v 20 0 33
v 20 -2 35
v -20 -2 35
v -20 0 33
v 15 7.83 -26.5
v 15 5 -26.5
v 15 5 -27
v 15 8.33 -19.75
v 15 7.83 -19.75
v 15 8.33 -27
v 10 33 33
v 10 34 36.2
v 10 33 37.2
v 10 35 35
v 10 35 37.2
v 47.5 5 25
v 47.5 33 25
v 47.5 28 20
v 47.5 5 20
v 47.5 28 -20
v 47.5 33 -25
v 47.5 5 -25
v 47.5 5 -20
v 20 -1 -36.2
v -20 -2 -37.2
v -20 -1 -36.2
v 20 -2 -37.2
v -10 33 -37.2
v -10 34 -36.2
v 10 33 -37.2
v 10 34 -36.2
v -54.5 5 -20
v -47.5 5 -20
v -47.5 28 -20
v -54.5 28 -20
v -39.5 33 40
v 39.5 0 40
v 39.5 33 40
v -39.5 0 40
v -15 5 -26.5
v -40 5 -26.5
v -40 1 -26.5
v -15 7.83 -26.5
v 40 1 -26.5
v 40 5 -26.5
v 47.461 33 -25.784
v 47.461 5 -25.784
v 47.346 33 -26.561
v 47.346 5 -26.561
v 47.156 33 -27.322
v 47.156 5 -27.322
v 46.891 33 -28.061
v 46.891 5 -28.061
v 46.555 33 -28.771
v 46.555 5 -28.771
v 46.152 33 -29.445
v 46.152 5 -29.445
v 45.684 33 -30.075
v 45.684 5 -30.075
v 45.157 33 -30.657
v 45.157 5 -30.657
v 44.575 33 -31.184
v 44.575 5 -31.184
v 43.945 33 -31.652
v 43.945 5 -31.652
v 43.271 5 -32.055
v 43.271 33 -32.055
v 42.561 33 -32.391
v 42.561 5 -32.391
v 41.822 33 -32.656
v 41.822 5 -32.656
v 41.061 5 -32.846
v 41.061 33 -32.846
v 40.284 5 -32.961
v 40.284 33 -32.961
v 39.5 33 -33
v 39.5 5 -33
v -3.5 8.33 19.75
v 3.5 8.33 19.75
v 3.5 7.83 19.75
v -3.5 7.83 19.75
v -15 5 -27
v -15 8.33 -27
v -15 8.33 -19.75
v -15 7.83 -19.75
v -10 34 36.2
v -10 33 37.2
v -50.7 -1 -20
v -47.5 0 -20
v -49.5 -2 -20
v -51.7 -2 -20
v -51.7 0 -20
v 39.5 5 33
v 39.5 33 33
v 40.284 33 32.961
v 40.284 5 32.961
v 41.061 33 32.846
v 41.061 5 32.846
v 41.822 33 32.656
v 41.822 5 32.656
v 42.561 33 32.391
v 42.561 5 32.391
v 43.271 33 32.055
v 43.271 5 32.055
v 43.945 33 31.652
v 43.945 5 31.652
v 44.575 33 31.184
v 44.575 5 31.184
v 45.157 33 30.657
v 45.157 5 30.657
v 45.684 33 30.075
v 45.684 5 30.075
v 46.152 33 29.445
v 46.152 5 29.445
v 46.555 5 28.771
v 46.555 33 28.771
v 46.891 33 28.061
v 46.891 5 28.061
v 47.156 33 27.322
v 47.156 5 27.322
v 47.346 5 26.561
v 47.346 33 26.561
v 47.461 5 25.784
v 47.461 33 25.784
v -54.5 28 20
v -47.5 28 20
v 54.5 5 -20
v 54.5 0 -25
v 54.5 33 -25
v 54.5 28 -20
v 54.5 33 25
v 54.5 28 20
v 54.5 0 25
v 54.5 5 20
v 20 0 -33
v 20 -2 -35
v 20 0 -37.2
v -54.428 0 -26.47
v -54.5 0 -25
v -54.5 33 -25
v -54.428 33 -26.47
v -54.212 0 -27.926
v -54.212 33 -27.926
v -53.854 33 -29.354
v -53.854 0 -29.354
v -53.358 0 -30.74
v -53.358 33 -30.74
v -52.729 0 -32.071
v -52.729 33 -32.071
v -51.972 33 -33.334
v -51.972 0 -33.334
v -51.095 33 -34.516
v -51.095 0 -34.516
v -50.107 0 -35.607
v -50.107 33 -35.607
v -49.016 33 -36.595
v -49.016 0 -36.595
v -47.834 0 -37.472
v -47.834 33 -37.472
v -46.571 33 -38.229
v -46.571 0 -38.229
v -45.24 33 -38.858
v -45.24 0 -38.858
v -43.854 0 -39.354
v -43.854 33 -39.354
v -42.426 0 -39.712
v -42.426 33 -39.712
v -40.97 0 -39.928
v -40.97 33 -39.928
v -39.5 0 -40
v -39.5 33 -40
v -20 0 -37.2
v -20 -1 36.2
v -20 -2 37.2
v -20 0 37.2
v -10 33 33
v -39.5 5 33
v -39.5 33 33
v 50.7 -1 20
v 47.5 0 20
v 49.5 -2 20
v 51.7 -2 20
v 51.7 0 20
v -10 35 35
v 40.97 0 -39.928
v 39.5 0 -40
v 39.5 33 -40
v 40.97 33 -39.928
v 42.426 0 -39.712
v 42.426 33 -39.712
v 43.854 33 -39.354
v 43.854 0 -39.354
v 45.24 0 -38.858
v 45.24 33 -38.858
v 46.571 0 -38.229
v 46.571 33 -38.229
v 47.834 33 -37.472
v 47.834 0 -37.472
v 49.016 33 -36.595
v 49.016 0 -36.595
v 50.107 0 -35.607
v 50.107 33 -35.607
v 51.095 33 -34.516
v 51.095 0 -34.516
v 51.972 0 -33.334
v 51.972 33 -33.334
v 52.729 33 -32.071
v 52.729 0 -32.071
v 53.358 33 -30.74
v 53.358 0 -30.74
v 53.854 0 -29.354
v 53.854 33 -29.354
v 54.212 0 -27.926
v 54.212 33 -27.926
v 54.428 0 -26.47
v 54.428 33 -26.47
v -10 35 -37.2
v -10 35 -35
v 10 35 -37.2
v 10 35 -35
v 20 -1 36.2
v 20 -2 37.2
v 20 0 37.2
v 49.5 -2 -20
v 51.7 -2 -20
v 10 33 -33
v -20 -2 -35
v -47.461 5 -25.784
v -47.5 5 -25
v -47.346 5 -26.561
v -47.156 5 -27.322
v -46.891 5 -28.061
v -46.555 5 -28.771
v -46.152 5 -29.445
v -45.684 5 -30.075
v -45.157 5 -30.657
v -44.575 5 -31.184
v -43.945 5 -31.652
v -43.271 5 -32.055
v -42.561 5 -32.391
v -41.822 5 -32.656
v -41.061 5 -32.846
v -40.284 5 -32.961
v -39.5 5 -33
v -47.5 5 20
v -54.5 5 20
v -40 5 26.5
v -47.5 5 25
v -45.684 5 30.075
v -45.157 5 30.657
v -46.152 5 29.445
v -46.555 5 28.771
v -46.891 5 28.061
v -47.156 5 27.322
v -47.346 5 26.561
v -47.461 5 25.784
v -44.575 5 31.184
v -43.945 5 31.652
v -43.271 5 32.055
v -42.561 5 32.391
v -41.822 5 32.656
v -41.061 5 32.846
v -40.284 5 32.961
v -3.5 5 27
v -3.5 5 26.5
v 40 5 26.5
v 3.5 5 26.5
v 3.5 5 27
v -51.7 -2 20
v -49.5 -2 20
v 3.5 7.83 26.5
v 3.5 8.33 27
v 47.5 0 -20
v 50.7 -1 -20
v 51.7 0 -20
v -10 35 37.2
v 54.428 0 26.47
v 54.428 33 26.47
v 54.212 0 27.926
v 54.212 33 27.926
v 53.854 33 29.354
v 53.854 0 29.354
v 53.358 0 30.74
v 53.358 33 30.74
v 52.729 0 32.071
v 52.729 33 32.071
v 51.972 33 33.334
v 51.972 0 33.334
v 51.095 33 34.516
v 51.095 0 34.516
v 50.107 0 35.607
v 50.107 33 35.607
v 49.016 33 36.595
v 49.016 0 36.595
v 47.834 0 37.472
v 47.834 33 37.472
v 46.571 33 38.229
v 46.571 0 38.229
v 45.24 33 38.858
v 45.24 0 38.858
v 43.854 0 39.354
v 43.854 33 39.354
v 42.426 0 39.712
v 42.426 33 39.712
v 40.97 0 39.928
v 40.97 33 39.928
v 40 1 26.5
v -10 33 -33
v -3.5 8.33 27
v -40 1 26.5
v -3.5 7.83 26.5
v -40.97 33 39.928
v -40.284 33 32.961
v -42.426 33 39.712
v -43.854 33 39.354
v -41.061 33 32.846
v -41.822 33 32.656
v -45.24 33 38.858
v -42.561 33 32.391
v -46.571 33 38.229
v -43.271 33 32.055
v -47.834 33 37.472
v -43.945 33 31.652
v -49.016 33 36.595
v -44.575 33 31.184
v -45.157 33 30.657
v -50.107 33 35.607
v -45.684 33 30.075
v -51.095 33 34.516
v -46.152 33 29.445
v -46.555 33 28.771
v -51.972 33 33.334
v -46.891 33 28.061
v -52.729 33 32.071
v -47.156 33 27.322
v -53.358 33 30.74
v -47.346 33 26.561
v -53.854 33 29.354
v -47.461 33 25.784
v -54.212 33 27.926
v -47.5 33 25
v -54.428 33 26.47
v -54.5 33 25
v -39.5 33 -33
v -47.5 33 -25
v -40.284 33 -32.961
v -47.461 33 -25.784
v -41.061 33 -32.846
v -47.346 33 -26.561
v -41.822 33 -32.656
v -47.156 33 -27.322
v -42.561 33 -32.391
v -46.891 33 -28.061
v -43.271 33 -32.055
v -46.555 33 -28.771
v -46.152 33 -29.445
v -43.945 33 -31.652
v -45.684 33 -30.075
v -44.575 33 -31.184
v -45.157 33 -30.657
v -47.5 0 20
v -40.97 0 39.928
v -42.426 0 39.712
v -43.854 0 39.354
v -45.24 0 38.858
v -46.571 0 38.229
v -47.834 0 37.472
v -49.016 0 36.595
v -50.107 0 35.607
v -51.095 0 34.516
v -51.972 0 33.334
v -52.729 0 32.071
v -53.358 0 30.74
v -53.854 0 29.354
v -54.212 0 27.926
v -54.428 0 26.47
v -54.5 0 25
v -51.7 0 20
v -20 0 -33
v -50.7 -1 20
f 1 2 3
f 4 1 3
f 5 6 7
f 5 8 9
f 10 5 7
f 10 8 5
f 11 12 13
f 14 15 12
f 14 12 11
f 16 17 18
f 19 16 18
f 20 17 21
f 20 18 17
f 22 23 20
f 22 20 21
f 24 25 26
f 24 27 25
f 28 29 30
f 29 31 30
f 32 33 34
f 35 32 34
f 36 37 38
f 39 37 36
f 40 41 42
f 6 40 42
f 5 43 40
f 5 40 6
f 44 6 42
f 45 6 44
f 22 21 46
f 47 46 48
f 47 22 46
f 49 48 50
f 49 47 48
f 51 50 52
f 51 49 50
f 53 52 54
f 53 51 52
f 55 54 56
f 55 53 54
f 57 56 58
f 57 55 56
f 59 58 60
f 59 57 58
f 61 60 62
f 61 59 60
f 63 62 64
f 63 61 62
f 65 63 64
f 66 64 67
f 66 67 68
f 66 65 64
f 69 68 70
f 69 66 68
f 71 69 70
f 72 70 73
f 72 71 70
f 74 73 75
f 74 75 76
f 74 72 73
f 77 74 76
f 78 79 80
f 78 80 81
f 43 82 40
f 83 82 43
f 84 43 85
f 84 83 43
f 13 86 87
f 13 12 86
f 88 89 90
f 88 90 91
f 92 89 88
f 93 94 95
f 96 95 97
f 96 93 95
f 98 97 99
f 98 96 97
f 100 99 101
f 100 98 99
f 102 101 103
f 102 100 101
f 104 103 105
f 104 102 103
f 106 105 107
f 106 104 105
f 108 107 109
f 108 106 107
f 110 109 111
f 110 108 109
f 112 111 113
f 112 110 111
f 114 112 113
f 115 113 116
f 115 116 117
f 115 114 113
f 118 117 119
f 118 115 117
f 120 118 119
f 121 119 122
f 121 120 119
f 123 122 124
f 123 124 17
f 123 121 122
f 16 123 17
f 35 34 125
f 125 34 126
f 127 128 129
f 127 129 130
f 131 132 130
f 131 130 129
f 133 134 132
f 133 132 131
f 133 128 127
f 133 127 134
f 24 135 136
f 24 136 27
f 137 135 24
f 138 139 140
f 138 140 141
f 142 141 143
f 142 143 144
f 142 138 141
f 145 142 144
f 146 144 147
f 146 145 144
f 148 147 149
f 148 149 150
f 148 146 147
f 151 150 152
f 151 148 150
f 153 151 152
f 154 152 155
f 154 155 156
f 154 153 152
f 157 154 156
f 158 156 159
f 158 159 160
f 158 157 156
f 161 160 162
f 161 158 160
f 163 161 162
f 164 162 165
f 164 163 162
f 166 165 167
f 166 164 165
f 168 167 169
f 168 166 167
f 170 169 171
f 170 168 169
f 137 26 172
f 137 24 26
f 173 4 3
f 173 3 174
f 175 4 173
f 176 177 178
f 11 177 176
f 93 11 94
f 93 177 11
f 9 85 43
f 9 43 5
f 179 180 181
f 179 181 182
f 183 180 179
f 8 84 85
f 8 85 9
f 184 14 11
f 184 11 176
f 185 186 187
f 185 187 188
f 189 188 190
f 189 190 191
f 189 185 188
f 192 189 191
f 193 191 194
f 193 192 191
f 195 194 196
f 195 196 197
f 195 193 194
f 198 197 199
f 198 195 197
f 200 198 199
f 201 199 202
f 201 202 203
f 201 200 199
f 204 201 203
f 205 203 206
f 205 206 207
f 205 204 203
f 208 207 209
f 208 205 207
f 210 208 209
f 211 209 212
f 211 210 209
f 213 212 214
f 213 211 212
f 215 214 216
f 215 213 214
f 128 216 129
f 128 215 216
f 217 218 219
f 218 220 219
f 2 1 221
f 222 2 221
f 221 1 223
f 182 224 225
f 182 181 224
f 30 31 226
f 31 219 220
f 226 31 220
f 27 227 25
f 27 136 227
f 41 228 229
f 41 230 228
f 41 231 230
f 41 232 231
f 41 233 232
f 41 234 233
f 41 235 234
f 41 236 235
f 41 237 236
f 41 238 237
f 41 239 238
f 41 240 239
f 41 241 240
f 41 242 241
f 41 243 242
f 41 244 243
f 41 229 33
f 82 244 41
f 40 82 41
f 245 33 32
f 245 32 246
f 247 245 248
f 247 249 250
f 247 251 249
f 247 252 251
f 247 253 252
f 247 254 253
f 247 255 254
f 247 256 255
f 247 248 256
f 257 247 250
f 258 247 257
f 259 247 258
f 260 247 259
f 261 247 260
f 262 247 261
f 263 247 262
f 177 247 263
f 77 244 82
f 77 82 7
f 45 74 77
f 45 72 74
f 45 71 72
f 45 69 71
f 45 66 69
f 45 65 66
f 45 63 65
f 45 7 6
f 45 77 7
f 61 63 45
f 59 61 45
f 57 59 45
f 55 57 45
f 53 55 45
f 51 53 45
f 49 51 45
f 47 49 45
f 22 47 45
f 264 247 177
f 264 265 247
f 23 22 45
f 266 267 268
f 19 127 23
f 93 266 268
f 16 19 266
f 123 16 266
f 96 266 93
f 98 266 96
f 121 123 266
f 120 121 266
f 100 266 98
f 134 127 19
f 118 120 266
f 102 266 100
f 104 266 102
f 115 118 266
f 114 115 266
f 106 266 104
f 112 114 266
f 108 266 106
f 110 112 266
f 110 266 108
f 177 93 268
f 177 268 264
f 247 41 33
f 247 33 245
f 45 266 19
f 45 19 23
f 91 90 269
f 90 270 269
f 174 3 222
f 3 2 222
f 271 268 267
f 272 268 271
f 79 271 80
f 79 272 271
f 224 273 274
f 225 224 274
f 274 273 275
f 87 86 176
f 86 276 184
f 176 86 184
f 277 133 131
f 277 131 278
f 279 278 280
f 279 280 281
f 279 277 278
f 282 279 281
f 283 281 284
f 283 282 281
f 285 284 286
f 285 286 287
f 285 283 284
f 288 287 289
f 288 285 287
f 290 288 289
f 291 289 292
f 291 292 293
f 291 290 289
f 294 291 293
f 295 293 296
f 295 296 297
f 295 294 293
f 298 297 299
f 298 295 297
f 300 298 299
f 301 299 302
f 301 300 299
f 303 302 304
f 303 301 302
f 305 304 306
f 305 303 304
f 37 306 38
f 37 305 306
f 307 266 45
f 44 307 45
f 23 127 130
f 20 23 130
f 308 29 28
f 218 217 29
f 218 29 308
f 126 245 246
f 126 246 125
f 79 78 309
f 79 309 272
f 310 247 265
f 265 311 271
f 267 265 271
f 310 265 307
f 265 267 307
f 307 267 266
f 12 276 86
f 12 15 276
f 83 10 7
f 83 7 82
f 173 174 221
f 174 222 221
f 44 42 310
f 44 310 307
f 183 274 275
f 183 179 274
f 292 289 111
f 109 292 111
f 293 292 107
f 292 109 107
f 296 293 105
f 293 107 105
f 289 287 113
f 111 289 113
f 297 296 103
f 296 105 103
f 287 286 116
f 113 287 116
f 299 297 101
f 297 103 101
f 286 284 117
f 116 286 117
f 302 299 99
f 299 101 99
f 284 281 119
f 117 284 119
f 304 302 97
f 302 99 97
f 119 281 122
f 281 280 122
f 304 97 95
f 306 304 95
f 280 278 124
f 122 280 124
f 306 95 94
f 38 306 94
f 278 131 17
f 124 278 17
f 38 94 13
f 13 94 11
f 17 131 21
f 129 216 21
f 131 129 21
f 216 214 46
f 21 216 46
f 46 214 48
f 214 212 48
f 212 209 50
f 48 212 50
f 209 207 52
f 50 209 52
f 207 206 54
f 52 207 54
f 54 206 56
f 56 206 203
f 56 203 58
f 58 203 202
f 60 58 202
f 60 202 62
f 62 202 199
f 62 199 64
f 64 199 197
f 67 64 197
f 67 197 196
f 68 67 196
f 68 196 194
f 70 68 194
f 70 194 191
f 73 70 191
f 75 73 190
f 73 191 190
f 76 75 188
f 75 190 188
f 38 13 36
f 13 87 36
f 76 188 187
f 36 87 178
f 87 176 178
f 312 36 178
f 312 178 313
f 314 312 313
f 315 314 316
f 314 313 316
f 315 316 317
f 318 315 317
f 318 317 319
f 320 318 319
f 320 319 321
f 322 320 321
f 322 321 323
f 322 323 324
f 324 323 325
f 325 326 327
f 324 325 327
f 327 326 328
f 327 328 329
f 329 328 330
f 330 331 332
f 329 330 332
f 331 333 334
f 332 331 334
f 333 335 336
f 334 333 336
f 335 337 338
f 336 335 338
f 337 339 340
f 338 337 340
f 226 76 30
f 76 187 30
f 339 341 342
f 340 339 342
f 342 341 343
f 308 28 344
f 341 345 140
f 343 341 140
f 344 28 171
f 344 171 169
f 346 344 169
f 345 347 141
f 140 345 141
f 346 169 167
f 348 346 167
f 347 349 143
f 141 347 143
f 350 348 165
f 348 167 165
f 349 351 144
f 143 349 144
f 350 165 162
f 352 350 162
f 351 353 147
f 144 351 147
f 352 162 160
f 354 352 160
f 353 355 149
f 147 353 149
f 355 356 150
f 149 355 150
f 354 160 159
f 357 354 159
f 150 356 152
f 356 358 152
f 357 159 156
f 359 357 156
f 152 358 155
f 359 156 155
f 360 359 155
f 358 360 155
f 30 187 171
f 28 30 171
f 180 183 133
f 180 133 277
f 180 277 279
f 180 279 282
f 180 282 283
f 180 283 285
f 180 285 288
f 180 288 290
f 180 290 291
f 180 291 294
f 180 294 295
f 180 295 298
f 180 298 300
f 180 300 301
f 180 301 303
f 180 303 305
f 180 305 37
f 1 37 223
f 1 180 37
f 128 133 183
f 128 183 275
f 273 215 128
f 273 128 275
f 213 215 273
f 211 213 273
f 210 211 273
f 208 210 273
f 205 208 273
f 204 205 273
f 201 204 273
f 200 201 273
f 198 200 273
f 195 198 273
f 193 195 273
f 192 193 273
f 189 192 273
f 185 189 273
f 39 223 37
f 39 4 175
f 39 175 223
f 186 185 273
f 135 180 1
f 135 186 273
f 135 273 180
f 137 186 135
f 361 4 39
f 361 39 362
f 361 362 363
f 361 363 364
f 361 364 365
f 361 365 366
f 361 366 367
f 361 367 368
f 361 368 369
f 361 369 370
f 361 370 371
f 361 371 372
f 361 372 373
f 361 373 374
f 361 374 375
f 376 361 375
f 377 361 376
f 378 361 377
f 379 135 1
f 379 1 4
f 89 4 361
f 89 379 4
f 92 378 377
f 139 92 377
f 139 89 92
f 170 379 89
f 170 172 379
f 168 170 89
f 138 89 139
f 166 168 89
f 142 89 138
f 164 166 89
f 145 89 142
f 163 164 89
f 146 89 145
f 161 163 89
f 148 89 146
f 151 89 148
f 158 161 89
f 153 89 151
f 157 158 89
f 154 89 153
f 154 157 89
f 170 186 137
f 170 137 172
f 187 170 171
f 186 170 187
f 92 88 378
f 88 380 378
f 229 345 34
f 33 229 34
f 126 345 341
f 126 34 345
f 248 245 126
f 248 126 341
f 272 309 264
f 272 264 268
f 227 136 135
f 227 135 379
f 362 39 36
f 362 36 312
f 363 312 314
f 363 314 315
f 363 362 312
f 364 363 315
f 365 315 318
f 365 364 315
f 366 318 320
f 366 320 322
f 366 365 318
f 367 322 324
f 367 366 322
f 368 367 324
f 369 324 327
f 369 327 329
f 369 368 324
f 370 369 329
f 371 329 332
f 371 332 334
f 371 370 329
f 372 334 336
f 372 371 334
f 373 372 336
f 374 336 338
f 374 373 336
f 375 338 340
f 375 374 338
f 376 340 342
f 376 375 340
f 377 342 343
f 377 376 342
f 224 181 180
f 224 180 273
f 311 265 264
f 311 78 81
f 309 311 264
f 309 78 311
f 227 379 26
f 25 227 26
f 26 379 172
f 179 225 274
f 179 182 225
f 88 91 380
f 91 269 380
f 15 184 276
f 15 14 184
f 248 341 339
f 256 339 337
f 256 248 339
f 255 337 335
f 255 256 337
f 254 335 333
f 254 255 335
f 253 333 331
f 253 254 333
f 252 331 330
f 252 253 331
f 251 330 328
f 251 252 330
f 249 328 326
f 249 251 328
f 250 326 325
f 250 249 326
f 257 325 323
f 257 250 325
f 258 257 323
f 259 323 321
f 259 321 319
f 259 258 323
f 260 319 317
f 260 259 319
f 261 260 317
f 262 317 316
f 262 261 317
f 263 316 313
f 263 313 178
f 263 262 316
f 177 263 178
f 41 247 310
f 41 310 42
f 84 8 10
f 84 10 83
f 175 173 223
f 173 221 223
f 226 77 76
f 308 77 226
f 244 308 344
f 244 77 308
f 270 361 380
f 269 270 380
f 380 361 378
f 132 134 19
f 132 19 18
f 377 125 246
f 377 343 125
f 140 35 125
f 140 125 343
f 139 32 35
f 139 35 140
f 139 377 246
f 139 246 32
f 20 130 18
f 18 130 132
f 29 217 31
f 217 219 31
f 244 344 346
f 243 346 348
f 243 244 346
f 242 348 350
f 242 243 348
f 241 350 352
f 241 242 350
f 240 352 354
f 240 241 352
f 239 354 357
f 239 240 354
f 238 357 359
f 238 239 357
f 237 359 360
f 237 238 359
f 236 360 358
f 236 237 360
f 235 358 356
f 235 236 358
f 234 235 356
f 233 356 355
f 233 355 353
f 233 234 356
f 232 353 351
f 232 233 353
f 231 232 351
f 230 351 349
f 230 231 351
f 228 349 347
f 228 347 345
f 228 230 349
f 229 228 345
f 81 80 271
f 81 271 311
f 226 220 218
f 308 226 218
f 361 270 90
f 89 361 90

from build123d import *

# Parameters (mm, degrees)
BOSS_EXTRUDE1_DEPTH     = 5
BOSS_EXTRUDE3_DEPTH     = 33
CUT_EXTRUDE2_DEPTH      = 121.706255016
CUT_EXTRUDE2_DEPTH_BACK = 121.706255016
SKETCH7_W               = 40
SKETCH7_H               = 23
CUT_EXTRUDE4_START      = 5
SKETCH3_W               = 80
SKETCH3_H               = 53
CUT_EXTRUDE4_DEPTH      = 4
SKETCH11_W              = 30
SKETCH11_H              = 0.5
SKETCH10_W              = 7
SKETCH10_H              = 0.5
BOSS_EXTRUDE4_START     = -54.5
BOSS_EXTRUDE4_DEPTH     = 20
BOSS_EXTRUDE5_DEPTH     = 20
BOSS_EXTRUDE6_DEPTH     = 10
CHAMFER1_SIZE           = 2


with BuildPart() as part:
    # Sketch1 → Boss-Extrude1 (new body)
    with BuildSketch(Plane(origin=(0, 0, 0), x_dir=(1, 0, 0), z_dir=(0, 1, 0))):
        with BuildLine():
            Line((-39.5, 40), (39.5, 40))
            ThreePointArc((39.5, 40), (50.106601718, 35.606601718), (54.5, 25))
            Line((54.5, 25), (54.5, -25))
            ThreePointArc((54.5, -25), (50.106601718, -35.606601718), (39.5, -40))
            Line((39.5, -40), (-39.5, -40))
            ThreePointArc((-39.5, -40), (-50.106601718, -35.606601718), (-54.5, -25))
            Line((-54.5, -25), (-54.5, 25))
            ThreePointArc((-54.5, 25), (-50.106601718, 35.606601718), (-39.5, 40))
        make_face()
    extrude(amount=BOSS_EXTRUDE1_DEPTH)

    # Sketch1<3> → Boss-Extrude3 (add)
    with BuildSketch(Plane(origin=(0, 0, 0), x_dir=(1, 0, 0), z_dir=(0, 1, 0))):
        with BuildLine():
            Line((-39.5, 40), (39.5, 40))
            ThreePointArc((39.5, 40), (50.106601718, 35.606601718), (54.5, 25))
            Line((54.5, 25), (54.5, -25))
            ThreePointArc((54.5, -25), (50.106601718, -35.606601718), (39.5, -40))
            Line((39.5, -40), (-39.5, -40))
            ThreePointArc((-39.5, -40), (-50.106601718, -35.606601718), (-54.5, -25))
            Line((-54.5, -25), (-54.5, 25))
            ThreePointArc((-54.5, 25), (-50.106601718, 35.606601718), (-39.5, 40))
        make_face()
        with BuildLine():
            ThreePointArc((-39.5, 33), (-45.156854249, 30.656854249), (-47.5, 25))
            Line((-47.5, 25), (-47.5, -25))
            ThreePointArc((-47.5, -25), (-45.156854249, -30.656854249), (-39.5, -33))
            Line((-39.5, -33), (39.5, -33))
            ThreePointArc((39.5, -33), (45.156854249, -30.656854249), (47.5, -25))
            Line((47.5, -25), (47.5, 25))
            ThreePointArc((47.5, 25), (45.156854249, 30.656854249), (39.5, 33))
            Line((39.5, 33), (-39.5, 33))
        make_face(mode=Mode.SUBTRACT)
    extrude(amount=BOSS_EXTRUDE3_DEPTH)

    # Sketch7 → Cut-Extrude2 (cut, two sides: drawn at the far end of the back side and taken through both)
    with BuildSketch(Plane.ZY.offset(54.5).offset(-CUT_EXTRUDE2_DEPTH_BACK)):
        with Locations((0, 16.5)):
            Rectangle(SKETCH7_W, SKETCH7_H)
    extrude(amount=CUT_EXTRUDE2_DEPTH + CUT_EXTRUDE2_DEPTH_BACK, mode=Mode.SUBTRACT)

    # Sketch3 → Cut-Extrude4 (cut)
    with BuildSketch(Plane(origin=(0, 0, 0), x_dir=(1, 0, 0), z_dir=(0, 1, 0)).offset(CUT_EXTRUDE4_START)):
        Rectangle(SKETCH3_W, SKETCH3_H)
    extrude(amount=-CUT_EXTRUDE4_DEPTH, mode=Mode.SUBTRACT)

    # Sweep2: sweep along a path in Sketch13
    with BuildLine(Plane(origin=(0, 0, 0), x_dir=(0, 0, -1), z_dir=(1, 0, 0))) as sweep2_path:
        Line((26.75, 5), (26.75, 8.08))
        Line((26.75, 8.08), (19.75, 8.08))
    # Sketch11 → Sweep2 (sweep)
    with BuildSketch(Plane(origin=(0, 5, 0), x_dir=(1, 0, 0), z_dir=(0, 1, 0))):
        with Locations((0, 26.75)):
            Rectangle(SKETCH11_W, SKETCH11_H)
    sweep(path=sweep2_path.line, transition=Transition.RIGHT)

    # Sweep3: sweep along a path in Sketch12
    with BuildLine(Plane(origin=(0, 0, 0), x_dir=(0, 0, -1), z_dir=(1, 0, 0))) as sweep3_path:
        Line((-26.75, 5), (-26.75, 8.08))
        Line((-26.75, 8.08), (-19.75, 8.08))
    # Sketch10 → Sweep3 (sweep)
    with BuildSketch(Plane(origin=(0, 5, 0), x_dir=(1, 0, 0), z_dir=(0, 1, 0))):
        with Locations((0, -26.75)):
            Rectangle(SKETCH10_W, SKETCH10_H)
    sweep(path=sweep3_path.line, transition=Transition.RIGHT)

    # Sketch19 → Boss-Extrude4 (add, symmetric)
    with BuildSketch(Plane(origin=(54.5, 0, 0), x_dir=(0, 0, -1), z_dir=(1, 0, 0)).offset(BOSS_EXTRUDE4_START)):
        Polygon((36.2, -1), (37.2, 0), (33, 0), (33, -2), (37.2, -2), align=None)
    boss_extrude4 = extrude(amount=BOSS_EXTRUDE4_DEPTH, both=True)

    # Mirror2: Boss-Extrude4 across plane
    add(boss_extrude4.mirror(Plane.XY))

    # Sketch20 → Boss-Extrude5 (add, symmetric)
    with BuildSketch(Plane.XY):
        Polygon((50.7, -1), (51.7, 0), (47.5, 0), (47.5, -2), (51.7, -2), align=None)
    boss_extrude5 = extrude(amount=BOSS_EXTRUDE5_DEPTH, both=True)

    # Mirror3: Boss-Extrude5 across plane
    add(boss_extrude5.mirror(Plane(origin=(0, 0, 0), x_dir=(0, 0, 1), z_dir=(1, 0, 0))))

    # Sketch21 → Boss-Extrude6 (add, symmetric)
    with BuildSketch(Plane(origin=(0, 0, 0), x_dir=(0, 0, -1), z_dir=(1, 0, 0))):
        Polygon((-36.2, 34), (-37.2, 33), (-33, 33), (-33, 35), (-37.2, 35), align=None)
    boss_extrude6 = extrude(amount=BOSS_EXTRUDE6_DEPTH, both=True)

    # Mirror4: Boss-Extrude6 across plane
    add(boss_extrude6.mirror(Plane.XY))

    # Chamfer1
    chamfer1_edges = [part.edges().sort_by_distance(p)[0] for p in [
        (-47.5, -2, 0),
        (0, -2, -33),
        (47.5, -2, 0),
        (0, -2, 33),
        (0, 35, -33),
        (0, 35, 33),
    ]]
    chamfer(chamfer1_edges, length=CHAMFER1_SIZE - 0.0001)  # a hair under: the kernel refuses the full size


solid = part.part
